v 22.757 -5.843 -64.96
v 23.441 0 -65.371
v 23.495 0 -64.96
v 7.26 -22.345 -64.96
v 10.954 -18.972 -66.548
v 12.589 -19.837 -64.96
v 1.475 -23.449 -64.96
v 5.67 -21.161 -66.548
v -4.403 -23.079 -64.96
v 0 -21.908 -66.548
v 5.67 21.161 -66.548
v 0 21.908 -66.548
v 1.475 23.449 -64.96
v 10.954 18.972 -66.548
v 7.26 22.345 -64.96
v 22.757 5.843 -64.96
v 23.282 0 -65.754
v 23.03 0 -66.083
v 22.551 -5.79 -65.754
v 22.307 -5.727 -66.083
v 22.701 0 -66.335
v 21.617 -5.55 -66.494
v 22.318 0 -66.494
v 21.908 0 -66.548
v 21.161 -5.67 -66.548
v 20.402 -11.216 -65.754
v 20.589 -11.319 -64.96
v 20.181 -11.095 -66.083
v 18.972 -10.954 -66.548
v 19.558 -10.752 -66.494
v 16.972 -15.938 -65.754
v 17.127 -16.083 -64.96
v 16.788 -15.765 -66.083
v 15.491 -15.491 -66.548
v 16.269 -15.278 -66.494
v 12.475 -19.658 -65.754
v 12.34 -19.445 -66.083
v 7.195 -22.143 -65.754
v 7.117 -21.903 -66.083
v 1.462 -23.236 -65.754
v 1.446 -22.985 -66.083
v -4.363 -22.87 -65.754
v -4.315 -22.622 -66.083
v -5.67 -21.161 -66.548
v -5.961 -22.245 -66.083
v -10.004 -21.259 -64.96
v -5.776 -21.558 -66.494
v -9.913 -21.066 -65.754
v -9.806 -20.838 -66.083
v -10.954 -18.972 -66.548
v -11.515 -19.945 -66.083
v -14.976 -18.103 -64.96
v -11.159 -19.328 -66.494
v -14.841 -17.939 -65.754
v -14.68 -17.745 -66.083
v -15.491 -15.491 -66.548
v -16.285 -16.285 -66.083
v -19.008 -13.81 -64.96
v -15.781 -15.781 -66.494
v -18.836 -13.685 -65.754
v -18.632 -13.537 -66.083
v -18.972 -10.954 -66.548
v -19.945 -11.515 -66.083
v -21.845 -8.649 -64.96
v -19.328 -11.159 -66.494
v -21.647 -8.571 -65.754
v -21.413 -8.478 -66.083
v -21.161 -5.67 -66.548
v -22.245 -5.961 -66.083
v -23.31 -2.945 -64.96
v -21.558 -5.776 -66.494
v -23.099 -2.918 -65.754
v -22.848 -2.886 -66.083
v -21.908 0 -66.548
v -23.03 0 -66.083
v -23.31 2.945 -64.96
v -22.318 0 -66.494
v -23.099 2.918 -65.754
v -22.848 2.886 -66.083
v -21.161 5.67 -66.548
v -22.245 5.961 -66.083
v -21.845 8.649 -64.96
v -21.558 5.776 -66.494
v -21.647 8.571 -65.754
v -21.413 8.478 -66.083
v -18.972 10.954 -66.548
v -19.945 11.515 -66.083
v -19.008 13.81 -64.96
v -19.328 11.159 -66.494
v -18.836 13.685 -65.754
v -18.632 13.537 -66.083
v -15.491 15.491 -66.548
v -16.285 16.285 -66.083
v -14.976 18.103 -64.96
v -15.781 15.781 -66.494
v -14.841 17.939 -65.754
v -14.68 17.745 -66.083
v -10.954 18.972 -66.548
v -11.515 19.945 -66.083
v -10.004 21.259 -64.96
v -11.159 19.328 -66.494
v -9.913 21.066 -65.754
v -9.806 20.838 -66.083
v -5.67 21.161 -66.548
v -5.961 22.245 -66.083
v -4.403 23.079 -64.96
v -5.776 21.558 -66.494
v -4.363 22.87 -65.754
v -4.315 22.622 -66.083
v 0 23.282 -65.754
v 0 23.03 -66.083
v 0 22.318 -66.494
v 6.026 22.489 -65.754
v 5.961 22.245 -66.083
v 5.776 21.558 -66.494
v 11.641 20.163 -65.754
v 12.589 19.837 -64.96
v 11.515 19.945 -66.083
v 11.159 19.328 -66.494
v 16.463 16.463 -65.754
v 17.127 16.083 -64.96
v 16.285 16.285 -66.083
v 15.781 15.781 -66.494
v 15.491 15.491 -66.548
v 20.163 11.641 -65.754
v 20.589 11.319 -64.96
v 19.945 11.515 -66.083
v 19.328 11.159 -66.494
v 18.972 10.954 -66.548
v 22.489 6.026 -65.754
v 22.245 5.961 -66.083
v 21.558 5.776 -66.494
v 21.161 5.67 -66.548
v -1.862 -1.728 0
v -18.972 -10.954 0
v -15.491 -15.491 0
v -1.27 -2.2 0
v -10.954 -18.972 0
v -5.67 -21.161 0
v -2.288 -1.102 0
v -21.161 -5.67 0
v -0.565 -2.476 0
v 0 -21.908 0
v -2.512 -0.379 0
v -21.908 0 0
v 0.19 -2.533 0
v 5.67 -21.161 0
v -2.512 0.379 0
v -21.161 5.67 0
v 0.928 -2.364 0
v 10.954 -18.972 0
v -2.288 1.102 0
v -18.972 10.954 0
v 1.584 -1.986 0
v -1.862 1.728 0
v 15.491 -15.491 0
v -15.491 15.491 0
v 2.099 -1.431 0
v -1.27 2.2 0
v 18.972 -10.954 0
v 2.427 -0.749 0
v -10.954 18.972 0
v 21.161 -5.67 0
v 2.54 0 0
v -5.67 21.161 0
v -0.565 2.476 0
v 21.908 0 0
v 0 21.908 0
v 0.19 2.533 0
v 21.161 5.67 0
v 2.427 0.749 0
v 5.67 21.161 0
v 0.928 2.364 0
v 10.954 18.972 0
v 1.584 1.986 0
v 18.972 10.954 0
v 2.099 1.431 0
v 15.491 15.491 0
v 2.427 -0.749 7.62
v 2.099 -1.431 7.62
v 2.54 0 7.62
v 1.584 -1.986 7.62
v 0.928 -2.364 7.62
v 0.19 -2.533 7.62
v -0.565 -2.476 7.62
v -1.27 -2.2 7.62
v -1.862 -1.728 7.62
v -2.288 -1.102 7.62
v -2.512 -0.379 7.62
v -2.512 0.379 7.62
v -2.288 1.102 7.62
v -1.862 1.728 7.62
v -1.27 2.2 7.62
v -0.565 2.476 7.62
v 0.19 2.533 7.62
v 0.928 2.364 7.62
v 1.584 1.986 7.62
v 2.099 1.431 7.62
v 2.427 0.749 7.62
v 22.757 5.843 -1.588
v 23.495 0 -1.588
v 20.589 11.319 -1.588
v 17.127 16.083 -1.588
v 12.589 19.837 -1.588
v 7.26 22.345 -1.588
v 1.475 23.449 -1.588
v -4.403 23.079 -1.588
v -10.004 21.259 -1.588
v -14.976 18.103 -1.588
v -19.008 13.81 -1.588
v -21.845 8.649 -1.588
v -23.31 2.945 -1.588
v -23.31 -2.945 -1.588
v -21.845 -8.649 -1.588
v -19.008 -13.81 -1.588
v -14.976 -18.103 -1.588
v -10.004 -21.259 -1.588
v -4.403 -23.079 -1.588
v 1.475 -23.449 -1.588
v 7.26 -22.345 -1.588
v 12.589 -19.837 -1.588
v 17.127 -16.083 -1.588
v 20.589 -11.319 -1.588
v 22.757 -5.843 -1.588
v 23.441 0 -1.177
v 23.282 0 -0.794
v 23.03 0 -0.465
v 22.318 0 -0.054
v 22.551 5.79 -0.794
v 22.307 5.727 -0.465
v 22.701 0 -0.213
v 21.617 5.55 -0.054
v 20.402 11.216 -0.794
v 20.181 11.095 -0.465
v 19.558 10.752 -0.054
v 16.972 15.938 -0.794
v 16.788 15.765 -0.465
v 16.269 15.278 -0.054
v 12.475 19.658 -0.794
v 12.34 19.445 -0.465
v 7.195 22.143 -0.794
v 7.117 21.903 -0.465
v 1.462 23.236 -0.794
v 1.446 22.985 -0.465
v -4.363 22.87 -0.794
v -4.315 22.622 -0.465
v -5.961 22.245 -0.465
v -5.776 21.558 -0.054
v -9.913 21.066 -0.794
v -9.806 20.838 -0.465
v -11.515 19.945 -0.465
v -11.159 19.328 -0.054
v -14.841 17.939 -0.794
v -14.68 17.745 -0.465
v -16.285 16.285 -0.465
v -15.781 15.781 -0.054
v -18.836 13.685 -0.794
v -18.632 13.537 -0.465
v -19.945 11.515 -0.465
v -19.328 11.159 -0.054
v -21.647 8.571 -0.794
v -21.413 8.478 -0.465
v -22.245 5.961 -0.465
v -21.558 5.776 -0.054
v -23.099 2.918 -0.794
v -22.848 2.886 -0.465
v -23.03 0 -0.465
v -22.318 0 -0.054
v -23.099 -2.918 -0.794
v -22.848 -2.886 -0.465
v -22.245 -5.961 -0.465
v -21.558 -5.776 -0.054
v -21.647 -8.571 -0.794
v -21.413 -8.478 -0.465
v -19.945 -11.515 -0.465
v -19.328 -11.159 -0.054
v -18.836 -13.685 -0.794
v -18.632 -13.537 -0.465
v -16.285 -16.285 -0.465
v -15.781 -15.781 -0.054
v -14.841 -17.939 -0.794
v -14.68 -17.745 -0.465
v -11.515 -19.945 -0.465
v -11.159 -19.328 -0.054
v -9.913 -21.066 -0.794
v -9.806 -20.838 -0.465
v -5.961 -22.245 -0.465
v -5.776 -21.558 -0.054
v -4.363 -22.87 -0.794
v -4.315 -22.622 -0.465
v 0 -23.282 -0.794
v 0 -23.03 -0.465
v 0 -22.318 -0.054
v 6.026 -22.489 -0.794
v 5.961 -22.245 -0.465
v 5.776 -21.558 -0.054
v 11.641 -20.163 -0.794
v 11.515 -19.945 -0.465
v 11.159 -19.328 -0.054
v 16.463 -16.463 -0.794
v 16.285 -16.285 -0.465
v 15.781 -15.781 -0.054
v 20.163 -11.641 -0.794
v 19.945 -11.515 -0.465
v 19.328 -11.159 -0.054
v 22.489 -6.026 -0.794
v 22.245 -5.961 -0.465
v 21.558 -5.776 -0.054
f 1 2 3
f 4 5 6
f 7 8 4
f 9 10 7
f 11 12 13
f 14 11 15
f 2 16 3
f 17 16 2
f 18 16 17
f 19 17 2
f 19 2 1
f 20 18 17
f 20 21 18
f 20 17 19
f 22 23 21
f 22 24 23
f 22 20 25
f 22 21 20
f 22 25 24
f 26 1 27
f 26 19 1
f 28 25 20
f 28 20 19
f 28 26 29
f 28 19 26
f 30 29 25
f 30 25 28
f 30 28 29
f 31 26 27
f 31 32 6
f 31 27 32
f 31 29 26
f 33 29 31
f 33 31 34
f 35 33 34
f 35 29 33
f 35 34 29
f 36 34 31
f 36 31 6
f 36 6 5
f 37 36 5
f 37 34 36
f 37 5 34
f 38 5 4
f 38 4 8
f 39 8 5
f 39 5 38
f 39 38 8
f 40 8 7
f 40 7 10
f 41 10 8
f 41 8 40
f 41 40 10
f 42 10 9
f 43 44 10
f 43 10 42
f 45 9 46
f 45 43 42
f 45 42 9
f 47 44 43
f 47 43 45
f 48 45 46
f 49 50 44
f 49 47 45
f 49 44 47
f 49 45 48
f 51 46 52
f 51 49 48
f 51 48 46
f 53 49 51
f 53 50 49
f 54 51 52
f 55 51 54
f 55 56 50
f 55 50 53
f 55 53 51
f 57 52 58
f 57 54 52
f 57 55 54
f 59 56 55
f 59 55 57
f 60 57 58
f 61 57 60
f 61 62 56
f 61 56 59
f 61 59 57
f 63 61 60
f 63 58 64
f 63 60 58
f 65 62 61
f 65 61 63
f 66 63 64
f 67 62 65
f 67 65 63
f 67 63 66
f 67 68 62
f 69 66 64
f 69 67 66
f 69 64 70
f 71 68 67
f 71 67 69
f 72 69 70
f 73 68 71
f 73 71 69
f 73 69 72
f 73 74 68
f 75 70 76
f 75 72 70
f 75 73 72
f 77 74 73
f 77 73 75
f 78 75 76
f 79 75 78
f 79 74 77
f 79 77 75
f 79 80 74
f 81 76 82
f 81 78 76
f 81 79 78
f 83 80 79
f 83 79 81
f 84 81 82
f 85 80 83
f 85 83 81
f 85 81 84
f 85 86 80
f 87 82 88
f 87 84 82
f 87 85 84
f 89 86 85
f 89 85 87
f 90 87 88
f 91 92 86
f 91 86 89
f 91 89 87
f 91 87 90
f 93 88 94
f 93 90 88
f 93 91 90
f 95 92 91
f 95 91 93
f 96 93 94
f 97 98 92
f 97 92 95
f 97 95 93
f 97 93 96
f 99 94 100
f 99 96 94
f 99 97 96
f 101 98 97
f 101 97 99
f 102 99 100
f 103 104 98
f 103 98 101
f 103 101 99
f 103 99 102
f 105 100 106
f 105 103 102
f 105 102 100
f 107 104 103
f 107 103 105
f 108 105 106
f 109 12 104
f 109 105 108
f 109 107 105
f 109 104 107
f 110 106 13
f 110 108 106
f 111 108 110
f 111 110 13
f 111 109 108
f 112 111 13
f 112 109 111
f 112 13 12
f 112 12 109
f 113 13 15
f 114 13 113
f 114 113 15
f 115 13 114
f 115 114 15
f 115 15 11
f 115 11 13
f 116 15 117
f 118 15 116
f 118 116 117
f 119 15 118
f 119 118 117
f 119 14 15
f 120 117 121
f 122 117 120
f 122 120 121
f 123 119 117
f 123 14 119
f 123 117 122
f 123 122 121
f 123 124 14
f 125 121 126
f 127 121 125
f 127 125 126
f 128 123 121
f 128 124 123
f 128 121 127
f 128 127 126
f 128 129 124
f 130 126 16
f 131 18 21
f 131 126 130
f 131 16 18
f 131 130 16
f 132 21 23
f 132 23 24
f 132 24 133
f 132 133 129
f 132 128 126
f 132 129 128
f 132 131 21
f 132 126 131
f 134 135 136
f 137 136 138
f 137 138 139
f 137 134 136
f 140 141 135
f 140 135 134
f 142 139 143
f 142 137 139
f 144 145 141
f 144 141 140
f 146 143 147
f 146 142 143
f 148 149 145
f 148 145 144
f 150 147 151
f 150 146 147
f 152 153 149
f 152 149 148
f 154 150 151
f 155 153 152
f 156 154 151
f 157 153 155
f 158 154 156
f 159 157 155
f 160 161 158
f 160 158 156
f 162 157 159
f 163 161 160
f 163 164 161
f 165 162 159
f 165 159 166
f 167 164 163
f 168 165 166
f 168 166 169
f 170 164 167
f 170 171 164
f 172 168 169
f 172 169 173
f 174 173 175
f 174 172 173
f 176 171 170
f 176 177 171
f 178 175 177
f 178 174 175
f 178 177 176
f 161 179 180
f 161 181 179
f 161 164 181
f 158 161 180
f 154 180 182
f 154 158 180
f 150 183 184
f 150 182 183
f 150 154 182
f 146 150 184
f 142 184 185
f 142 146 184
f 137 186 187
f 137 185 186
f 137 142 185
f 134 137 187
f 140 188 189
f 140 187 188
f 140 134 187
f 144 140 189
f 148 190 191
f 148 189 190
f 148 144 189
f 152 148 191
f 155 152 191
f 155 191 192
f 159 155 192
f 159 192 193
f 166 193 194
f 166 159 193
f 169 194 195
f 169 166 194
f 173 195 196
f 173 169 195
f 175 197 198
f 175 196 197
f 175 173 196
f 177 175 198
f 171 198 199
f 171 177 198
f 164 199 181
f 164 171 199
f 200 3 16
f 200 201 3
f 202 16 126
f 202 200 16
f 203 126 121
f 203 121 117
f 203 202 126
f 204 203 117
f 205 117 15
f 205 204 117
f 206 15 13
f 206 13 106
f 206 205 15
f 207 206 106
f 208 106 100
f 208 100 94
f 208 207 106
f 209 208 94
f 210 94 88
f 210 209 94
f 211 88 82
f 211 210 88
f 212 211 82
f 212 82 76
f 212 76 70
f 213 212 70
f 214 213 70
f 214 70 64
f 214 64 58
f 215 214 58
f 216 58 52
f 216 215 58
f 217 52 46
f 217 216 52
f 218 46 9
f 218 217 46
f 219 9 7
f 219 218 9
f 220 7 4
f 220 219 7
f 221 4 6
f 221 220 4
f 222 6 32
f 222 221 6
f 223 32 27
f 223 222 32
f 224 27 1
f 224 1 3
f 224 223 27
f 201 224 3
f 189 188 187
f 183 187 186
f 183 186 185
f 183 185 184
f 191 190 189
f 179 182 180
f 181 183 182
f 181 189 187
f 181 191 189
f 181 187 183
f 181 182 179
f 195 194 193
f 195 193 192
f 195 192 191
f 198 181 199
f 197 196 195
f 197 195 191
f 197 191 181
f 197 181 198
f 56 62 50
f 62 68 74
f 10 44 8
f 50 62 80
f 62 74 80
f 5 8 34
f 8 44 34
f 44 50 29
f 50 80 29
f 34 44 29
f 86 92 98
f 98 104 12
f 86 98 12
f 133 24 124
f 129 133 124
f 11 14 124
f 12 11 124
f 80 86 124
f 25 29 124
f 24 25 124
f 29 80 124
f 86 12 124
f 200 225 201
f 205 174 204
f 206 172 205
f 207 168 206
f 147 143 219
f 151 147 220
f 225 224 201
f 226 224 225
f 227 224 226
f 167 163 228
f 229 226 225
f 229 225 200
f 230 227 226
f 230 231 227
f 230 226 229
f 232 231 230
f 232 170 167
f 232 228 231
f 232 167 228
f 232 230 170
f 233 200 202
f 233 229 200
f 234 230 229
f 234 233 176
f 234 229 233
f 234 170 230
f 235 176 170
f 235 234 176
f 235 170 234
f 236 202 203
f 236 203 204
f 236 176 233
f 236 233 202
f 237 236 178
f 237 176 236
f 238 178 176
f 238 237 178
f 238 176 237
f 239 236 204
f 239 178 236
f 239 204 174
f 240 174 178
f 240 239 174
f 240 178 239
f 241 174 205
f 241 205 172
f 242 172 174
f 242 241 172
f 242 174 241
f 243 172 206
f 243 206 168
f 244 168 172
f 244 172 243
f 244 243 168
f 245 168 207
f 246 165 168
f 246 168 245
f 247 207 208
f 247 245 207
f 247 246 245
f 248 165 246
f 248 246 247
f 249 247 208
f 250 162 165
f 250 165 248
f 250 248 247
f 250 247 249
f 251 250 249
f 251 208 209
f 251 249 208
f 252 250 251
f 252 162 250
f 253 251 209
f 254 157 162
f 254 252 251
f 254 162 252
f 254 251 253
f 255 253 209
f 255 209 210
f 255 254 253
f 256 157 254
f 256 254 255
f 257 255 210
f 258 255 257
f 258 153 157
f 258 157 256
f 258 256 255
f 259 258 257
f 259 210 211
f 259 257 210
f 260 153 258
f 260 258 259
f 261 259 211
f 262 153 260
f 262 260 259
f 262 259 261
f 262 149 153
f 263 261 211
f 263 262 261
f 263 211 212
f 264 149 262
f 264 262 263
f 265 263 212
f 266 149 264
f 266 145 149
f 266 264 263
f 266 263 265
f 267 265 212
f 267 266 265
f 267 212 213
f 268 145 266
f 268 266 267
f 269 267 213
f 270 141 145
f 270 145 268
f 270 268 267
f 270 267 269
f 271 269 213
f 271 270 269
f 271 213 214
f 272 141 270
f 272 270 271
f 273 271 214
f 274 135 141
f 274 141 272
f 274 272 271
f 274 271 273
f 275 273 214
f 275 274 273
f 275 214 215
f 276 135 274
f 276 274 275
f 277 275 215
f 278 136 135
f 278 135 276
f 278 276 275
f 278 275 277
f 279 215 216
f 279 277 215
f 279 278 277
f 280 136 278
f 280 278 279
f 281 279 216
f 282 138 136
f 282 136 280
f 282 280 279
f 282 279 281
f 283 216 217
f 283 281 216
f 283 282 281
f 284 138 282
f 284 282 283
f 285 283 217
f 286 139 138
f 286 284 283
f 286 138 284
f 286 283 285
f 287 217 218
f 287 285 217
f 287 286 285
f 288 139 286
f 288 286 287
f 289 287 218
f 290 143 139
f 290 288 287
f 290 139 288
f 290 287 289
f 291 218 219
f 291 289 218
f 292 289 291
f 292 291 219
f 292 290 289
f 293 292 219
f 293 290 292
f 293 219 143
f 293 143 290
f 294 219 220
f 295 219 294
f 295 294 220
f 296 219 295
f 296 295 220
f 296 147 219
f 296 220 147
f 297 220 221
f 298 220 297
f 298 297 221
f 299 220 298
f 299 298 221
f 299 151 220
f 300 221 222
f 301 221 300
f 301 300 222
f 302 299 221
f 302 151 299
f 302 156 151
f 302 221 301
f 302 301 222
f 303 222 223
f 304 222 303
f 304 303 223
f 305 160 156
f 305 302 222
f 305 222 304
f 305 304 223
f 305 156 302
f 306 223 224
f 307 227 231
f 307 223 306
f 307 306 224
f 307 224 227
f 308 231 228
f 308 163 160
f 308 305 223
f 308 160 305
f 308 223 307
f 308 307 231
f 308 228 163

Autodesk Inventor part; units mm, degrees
ref_plane "YZ Plane" through (0, 0, 0) normal (1, 0, 0) x (0, 1, 0)
ref_plane "XZ Plane" through (0, 0, 0) normal (0, 1, 0) x (-1, 0, 0)
ref_plane "XY Plane" through (0, 0, 0) normal (0, 0, 1) x (1, 0, 0)
sketch "Sketch1" plane through (0, 0, 0) normal (0, 0, 1) x (1, 0, 0)
  circle A0 centre (0, 0) radius 23.495
  circle A1 centre (0, 0) radius 2.54
  dimension "d0" = 46.99
  dimension "d3" = 5.08
extrude "Extrusion1" add sketch "Sketch1" against normal blind 66.548 contours A0 | A1
extrude "Extrusion2" add sketch "Sketch1" along normal blind 7.62 contours A1
fillet "Fillet1" radius 1.5875 1 edges at (-23.495, 0, 0)
fillet "Fillet2" radius 1.5875 1 edges at (-23.495, 0, -66.548)
properties part number "proxy 775 motor"
